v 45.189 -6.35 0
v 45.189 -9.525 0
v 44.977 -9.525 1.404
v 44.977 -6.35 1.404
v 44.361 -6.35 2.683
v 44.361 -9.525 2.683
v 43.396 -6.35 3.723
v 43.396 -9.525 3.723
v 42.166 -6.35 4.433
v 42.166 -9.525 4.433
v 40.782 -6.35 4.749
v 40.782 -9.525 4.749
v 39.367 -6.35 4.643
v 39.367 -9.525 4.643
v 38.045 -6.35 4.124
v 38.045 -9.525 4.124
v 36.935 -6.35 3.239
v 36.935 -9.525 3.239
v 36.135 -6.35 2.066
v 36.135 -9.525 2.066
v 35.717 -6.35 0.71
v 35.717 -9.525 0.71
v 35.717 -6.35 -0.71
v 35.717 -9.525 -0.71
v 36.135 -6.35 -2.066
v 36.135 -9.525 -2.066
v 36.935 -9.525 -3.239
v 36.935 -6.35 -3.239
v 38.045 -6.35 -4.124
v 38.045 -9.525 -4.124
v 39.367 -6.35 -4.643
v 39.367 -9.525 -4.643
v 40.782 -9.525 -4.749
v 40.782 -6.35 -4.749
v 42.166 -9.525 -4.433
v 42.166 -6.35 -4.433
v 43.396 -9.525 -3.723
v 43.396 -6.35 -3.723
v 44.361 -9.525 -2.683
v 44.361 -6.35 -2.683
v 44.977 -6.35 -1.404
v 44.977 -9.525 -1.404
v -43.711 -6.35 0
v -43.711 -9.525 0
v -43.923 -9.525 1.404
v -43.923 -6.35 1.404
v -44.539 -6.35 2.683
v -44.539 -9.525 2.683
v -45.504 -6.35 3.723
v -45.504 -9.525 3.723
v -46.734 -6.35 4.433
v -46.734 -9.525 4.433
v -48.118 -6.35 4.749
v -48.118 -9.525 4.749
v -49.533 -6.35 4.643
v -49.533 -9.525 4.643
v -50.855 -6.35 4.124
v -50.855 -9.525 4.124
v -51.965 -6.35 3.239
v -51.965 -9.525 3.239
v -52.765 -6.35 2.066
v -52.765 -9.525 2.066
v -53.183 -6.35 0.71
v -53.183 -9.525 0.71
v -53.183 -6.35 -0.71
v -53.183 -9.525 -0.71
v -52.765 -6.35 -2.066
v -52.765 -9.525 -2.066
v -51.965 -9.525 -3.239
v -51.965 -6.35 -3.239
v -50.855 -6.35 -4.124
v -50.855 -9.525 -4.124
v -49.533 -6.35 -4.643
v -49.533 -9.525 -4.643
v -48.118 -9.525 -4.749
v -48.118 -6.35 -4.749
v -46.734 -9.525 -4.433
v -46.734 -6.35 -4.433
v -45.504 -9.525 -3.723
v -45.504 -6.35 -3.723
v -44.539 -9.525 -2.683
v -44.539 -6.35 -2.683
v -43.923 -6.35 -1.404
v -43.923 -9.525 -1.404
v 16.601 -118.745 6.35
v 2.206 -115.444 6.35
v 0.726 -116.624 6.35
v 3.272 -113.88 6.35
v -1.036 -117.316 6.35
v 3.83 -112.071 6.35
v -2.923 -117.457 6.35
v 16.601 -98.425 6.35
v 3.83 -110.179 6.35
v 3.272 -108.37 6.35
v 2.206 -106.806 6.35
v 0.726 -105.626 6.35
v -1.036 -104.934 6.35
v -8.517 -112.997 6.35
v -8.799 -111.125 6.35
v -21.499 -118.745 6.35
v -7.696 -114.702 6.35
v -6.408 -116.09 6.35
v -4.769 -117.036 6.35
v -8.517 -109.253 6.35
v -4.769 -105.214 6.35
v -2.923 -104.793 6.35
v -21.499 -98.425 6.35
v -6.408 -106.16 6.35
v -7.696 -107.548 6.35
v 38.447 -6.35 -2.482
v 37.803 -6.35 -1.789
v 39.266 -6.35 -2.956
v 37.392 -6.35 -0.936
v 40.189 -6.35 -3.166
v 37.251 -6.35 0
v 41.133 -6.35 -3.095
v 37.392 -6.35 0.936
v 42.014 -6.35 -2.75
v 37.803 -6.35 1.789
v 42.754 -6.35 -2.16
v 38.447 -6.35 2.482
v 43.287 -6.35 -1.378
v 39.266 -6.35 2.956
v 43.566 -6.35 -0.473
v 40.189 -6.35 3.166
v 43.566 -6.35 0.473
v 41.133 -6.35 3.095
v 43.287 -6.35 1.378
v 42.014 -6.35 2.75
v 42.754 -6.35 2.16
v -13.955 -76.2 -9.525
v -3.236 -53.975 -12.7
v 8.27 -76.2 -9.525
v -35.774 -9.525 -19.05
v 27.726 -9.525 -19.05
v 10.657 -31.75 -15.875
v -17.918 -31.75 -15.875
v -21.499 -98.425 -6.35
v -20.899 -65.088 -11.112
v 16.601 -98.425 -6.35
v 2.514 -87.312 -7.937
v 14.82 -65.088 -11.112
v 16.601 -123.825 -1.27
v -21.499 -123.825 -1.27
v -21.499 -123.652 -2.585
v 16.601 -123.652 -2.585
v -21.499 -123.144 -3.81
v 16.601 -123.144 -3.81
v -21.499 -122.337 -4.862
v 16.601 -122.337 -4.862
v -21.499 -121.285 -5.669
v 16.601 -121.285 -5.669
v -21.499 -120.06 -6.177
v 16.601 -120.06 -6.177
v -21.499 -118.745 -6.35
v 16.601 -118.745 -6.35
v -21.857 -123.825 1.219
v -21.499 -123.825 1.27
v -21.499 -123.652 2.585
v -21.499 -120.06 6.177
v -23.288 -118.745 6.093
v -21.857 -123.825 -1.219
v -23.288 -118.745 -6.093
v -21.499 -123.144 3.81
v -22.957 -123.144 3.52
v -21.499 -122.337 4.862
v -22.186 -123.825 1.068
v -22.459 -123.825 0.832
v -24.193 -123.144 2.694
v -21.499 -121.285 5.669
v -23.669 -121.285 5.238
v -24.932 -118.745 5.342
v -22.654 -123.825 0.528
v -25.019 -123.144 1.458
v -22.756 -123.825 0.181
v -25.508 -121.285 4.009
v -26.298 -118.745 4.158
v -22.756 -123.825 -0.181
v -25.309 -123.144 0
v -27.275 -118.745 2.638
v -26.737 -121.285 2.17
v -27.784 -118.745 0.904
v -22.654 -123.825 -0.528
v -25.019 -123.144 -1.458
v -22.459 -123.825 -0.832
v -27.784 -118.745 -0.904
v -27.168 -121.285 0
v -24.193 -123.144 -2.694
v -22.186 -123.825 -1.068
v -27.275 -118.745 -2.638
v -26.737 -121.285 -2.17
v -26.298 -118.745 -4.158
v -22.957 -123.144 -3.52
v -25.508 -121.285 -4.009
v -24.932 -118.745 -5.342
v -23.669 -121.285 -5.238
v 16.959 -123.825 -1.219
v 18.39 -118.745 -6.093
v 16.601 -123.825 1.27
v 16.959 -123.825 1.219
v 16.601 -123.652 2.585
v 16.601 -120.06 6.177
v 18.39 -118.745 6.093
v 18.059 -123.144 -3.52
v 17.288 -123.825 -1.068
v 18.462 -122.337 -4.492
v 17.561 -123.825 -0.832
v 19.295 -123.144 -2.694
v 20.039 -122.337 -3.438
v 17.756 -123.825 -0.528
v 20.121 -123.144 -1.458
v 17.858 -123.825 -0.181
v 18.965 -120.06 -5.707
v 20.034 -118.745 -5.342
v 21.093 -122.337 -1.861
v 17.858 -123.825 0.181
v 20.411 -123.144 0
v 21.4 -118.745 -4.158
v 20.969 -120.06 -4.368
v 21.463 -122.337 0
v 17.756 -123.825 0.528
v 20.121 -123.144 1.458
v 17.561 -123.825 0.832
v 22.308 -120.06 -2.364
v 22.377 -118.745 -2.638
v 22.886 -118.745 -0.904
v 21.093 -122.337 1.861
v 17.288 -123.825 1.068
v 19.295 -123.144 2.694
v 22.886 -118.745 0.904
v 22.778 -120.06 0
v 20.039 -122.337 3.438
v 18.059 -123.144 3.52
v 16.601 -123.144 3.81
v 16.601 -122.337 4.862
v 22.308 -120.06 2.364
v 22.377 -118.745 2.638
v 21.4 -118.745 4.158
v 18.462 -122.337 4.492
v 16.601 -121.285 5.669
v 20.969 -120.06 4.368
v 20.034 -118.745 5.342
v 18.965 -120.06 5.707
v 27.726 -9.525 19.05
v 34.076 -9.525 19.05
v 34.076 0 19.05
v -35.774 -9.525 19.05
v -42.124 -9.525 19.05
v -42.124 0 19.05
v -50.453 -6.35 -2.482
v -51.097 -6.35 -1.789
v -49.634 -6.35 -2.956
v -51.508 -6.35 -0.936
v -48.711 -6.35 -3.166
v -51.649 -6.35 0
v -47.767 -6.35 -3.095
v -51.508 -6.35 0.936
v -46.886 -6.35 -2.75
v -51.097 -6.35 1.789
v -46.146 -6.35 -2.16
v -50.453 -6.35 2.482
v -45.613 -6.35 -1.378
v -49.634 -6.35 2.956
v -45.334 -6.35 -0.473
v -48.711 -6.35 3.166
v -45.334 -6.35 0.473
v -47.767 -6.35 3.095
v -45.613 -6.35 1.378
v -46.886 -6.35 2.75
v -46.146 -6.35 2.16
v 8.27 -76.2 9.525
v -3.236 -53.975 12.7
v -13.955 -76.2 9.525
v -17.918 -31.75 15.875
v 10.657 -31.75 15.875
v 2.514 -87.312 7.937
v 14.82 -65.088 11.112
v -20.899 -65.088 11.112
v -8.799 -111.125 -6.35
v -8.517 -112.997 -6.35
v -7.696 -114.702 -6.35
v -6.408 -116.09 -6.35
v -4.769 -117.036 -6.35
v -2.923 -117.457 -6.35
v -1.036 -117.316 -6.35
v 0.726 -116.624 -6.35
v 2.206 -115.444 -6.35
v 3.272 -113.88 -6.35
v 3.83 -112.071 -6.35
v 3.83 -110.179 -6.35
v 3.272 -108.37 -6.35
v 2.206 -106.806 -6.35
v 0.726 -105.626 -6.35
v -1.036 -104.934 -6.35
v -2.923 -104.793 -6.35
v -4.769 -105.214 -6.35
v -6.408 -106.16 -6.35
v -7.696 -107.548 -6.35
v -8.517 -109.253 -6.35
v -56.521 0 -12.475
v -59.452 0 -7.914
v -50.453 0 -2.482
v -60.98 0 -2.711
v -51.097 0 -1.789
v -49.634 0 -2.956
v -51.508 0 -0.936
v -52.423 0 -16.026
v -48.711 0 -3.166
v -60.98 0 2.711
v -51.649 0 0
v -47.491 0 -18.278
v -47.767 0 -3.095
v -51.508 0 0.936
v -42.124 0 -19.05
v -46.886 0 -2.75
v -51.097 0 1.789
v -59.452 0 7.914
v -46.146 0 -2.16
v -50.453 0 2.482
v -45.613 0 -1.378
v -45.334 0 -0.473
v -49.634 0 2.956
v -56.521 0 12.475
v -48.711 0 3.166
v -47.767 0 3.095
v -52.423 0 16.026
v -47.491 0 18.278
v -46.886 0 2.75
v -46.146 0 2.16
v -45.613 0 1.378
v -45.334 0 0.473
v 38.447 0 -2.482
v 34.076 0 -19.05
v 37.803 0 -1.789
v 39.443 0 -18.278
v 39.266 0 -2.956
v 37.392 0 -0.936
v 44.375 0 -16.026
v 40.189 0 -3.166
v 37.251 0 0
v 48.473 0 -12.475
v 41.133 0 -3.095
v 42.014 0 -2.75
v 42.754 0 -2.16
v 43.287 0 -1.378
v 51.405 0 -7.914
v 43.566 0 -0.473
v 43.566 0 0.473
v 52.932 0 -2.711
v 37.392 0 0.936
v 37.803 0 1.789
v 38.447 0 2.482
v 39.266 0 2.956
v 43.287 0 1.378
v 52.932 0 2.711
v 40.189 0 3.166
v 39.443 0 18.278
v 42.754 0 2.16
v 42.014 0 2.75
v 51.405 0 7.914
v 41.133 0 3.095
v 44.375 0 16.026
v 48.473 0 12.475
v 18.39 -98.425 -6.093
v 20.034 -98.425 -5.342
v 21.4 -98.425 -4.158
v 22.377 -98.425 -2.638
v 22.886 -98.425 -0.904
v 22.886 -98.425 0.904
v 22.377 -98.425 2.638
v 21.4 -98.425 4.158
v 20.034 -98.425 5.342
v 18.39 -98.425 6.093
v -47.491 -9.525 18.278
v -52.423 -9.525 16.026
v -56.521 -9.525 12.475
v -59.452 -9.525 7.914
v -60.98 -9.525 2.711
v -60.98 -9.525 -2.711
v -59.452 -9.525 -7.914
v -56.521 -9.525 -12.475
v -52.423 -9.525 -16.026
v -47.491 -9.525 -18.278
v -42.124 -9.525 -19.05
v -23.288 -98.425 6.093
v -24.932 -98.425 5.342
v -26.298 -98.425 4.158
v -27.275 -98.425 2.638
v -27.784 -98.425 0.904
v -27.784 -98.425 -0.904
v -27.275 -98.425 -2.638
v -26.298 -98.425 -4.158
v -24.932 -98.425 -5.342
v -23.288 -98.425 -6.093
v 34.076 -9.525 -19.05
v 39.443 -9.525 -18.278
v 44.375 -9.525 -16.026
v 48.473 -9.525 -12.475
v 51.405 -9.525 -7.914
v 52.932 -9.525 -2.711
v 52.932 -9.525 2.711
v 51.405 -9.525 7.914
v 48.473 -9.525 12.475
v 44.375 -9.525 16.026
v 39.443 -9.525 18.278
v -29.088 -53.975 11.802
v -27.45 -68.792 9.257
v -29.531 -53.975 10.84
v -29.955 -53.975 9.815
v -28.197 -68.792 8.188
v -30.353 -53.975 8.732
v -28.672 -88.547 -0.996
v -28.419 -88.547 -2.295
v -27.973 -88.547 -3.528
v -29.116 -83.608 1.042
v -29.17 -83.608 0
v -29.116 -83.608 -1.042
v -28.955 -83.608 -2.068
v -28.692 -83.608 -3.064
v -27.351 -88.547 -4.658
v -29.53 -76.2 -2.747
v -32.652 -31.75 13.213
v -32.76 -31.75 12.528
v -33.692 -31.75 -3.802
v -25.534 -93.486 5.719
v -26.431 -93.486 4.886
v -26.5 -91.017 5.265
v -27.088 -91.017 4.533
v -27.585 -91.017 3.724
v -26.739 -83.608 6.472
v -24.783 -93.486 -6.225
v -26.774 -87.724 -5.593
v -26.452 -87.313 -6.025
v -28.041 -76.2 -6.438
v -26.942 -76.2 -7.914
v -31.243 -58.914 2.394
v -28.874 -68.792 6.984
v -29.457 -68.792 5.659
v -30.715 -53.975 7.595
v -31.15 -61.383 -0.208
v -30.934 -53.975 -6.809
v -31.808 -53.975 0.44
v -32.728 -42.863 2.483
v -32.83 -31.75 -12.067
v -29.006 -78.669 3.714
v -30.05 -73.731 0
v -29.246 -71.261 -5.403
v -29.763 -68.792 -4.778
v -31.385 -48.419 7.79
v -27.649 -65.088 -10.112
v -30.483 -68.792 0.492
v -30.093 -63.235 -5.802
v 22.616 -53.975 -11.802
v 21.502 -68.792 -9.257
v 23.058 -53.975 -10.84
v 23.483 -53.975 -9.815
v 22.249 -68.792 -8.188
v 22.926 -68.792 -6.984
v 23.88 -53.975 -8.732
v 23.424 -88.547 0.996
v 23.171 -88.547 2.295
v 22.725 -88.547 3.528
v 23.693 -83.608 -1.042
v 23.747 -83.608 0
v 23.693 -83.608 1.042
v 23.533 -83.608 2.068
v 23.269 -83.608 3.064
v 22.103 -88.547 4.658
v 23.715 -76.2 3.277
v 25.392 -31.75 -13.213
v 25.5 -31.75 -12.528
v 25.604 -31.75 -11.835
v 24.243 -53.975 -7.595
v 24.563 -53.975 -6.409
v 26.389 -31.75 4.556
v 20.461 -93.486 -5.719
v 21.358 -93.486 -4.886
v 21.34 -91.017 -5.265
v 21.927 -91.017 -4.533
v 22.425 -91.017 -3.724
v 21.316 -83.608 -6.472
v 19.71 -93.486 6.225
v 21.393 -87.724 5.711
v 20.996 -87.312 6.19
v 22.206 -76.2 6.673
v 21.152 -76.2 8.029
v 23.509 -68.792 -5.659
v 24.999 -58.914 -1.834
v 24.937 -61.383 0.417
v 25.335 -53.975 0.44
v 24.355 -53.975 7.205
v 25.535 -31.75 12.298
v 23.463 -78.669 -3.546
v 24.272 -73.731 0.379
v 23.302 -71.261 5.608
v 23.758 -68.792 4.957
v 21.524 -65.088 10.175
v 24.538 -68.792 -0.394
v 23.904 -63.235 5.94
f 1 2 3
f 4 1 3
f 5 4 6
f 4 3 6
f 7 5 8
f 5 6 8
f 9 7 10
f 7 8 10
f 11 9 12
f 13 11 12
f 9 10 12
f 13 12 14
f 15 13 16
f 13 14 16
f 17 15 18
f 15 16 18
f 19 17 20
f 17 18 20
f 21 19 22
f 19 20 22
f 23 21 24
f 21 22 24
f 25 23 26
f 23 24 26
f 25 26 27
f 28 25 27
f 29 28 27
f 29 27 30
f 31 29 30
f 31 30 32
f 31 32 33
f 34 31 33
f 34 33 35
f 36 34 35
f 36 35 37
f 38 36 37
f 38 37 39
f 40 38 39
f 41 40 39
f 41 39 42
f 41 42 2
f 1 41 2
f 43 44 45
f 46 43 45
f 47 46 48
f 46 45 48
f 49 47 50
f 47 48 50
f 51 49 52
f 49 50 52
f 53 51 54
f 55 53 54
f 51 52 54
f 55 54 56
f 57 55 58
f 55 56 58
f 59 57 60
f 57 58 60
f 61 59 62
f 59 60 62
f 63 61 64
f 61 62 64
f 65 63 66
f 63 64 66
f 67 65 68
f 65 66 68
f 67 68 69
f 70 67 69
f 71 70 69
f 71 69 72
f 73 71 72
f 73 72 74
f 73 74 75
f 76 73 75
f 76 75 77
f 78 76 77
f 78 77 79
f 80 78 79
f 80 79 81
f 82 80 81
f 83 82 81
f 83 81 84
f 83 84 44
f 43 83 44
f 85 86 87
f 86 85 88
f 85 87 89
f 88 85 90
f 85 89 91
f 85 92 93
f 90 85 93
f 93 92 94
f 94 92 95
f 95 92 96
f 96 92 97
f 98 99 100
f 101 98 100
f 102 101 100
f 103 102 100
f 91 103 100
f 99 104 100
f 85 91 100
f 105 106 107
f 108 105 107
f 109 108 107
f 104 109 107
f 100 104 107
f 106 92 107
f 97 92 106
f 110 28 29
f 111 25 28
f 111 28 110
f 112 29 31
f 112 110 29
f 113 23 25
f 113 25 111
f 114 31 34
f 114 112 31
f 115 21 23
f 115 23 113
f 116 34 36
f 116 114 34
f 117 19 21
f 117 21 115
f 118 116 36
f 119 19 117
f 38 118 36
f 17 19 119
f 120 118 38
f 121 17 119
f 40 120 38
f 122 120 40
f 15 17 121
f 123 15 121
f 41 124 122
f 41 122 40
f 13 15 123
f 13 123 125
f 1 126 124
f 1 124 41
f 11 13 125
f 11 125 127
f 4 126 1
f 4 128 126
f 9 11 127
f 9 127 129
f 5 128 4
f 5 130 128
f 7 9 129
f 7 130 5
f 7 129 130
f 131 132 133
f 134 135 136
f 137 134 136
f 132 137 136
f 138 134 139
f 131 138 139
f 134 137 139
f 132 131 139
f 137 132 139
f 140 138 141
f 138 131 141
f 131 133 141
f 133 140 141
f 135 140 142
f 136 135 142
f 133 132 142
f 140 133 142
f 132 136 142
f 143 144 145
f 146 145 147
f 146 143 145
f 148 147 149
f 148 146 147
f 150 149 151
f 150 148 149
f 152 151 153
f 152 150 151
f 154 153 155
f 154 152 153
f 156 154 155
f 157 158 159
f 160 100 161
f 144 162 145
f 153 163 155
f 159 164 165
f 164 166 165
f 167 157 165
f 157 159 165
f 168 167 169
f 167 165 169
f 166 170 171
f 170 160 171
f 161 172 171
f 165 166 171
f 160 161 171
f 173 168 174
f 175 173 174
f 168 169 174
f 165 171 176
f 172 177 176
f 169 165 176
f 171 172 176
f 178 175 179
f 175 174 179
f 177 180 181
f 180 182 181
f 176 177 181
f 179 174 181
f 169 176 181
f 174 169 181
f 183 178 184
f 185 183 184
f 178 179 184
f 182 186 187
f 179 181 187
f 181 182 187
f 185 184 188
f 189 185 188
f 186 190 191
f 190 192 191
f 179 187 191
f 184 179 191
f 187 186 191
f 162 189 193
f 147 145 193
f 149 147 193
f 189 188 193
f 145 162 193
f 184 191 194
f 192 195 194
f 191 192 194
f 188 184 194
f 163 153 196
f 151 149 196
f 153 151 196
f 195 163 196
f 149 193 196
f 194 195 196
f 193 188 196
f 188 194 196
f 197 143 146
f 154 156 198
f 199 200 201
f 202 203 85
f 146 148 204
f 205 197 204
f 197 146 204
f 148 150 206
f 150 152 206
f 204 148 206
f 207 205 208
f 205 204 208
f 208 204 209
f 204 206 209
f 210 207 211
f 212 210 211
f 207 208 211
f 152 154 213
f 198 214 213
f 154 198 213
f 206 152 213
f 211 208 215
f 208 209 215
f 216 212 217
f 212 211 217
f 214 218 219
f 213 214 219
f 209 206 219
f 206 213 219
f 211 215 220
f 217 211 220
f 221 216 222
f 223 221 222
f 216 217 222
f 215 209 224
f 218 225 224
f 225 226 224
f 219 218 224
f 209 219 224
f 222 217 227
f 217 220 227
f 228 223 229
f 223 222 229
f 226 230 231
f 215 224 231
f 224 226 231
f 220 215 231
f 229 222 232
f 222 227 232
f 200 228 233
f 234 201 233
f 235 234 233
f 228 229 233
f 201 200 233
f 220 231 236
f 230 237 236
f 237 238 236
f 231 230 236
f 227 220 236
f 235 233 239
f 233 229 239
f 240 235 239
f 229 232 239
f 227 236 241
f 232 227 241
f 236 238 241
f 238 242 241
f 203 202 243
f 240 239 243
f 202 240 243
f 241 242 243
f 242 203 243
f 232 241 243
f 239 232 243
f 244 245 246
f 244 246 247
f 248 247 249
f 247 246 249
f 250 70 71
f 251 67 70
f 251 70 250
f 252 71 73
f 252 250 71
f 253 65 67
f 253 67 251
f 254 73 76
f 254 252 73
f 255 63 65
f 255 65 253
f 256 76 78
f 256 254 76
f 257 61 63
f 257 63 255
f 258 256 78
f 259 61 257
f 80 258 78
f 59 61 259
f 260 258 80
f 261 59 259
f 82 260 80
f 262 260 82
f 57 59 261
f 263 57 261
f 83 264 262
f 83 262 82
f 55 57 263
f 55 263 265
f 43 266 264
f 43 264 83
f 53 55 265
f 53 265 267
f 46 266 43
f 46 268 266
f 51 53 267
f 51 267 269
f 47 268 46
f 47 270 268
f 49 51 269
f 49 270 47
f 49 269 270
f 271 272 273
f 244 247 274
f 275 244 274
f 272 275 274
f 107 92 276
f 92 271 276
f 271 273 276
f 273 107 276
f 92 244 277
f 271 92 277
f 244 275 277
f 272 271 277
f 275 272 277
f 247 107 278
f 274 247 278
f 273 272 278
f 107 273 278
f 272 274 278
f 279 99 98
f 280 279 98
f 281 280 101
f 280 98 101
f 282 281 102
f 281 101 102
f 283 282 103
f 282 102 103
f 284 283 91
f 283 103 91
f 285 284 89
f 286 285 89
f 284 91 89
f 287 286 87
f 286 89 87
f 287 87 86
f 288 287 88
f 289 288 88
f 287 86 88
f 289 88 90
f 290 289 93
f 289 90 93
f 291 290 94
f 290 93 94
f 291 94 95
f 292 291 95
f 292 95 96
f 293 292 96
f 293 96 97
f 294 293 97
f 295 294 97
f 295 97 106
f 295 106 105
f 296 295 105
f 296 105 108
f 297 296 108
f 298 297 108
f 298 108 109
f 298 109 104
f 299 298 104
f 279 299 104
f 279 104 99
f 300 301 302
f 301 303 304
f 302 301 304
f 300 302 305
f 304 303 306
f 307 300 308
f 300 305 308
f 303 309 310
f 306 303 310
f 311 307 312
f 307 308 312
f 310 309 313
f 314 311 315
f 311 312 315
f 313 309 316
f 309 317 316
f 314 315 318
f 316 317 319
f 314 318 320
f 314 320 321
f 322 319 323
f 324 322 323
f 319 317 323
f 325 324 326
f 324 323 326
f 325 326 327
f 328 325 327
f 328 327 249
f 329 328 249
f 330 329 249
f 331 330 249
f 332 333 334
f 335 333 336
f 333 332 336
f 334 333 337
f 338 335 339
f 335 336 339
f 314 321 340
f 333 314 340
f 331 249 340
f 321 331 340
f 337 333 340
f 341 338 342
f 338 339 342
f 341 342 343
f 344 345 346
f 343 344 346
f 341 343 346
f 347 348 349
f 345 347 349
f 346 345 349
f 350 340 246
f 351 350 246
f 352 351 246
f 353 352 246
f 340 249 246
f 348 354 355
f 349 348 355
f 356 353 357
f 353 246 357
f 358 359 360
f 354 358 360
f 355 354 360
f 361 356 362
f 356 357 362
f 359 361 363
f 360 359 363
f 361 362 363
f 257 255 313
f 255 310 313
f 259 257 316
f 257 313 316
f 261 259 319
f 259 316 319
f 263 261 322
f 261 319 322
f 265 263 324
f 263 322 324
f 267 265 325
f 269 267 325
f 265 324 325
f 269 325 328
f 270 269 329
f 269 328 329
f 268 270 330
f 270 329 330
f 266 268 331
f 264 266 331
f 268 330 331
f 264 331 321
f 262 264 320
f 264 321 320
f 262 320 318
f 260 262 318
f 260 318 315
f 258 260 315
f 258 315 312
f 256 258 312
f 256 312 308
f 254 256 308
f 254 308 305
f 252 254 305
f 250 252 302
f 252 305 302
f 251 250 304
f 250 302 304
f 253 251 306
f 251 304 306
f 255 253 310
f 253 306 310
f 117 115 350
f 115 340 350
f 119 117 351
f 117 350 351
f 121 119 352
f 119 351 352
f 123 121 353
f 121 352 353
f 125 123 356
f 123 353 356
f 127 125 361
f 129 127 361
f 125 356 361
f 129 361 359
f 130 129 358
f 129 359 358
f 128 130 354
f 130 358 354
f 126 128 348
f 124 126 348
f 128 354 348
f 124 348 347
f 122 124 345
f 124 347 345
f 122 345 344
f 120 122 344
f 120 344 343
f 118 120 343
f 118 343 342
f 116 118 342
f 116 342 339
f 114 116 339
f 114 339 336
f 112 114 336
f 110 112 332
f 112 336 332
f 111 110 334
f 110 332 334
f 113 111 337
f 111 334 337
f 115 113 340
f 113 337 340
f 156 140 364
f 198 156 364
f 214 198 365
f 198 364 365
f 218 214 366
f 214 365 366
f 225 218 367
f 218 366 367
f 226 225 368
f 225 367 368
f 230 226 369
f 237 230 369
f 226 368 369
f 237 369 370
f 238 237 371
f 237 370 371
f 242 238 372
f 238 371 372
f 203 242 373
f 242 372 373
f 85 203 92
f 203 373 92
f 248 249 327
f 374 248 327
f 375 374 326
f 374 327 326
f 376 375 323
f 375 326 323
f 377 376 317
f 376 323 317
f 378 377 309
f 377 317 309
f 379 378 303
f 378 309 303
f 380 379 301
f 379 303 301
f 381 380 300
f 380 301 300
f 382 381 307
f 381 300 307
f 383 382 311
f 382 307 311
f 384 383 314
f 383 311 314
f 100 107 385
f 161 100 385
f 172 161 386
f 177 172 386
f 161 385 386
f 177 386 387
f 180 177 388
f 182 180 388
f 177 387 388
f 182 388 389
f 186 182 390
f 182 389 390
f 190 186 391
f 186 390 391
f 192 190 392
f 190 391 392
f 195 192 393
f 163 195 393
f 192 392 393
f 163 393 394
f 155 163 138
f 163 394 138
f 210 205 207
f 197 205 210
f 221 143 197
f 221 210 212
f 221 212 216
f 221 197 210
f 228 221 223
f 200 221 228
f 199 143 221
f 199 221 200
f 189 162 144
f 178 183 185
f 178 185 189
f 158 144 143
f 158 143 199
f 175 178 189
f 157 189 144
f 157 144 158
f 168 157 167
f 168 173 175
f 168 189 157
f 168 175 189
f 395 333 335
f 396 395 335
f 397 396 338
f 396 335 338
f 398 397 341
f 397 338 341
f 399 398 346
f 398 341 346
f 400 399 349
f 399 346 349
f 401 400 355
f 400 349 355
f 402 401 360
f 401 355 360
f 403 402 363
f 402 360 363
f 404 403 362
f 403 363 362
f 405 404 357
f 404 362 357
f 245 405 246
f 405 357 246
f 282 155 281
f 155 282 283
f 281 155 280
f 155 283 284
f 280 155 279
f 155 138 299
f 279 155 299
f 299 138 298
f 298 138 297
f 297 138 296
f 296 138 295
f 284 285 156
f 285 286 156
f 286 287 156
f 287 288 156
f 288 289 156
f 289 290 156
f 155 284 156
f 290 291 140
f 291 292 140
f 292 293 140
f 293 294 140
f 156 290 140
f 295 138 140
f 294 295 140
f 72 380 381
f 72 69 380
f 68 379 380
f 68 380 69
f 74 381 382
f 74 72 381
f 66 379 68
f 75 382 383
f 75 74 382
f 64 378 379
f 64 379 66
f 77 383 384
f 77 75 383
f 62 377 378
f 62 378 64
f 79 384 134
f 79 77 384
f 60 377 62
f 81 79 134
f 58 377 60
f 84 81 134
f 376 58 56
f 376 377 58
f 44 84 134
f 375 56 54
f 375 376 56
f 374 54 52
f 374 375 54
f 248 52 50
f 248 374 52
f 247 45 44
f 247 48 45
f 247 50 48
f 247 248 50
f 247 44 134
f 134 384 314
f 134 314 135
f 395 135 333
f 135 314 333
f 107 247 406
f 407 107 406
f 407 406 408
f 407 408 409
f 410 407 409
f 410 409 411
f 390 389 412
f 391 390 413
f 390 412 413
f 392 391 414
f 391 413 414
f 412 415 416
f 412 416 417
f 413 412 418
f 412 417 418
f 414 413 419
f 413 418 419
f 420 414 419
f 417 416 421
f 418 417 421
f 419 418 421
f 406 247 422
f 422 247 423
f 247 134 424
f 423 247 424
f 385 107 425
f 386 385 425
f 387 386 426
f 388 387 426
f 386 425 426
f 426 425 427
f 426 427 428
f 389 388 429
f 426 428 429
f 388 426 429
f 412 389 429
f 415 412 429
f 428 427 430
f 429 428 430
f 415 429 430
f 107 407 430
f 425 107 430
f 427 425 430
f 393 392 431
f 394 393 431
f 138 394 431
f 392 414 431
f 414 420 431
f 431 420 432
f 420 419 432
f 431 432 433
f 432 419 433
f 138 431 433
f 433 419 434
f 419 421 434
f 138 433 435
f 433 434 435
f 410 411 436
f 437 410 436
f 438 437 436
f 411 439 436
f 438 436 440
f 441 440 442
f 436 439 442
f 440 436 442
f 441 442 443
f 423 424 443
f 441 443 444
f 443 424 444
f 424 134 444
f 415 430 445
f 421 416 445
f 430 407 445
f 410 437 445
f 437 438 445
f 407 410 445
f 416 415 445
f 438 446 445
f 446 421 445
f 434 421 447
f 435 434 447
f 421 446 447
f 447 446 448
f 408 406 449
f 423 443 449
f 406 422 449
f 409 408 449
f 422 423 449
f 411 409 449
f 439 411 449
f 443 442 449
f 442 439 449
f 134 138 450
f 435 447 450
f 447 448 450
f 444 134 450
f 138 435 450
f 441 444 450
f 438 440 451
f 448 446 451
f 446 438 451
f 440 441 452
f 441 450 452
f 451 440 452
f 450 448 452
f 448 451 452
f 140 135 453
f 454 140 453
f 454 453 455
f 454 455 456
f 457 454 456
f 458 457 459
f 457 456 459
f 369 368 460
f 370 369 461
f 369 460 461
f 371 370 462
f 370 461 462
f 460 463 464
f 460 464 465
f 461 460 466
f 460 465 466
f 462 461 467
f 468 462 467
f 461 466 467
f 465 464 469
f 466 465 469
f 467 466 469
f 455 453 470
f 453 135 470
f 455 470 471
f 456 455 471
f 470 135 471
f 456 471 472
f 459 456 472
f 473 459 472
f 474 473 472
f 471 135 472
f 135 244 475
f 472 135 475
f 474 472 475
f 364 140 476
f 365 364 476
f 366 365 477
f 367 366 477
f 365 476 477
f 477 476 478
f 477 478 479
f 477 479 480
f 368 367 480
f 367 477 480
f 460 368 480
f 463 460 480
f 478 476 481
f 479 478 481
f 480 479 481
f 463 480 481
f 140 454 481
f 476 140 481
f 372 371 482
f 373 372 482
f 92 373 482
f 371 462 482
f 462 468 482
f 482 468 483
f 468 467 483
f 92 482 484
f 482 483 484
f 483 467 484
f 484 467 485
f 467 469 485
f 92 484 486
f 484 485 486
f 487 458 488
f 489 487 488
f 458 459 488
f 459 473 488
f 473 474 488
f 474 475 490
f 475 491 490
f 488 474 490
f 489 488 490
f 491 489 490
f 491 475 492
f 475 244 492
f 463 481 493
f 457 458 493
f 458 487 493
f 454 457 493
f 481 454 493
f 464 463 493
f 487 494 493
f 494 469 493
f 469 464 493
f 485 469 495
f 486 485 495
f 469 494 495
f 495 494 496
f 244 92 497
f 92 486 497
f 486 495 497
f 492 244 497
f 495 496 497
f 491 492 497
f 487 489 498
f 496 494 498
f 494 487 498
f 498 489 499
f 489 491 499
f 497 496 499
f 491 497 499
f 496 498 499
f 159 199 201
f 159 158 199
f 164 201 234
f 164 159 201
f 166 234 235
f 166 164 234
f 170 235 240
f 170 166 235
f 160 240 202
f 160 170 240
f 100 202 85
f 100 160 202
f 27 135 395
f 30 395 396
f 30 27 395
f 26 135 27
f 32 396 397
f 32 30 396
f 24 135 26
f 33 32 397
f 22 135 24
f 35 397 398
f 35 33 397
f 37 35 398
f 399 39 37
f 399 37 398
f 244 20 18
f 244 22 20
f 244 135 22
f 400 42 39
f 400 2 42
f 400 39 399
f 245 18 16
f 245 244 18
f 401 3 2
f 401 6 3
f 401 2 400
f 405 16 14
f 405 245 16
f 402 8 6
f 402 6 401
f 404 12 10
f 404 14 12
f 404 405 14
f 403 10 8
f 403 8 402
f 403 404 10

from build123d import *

# Parameters (mm, degrees)
F1_DEPTH       = 9.525
F3_D           = 6.35
F3_CBORE_D     = 9.525
F3_CBORE_DEPTH = 3.175
F4_W           = 63.5
F4_H           = 38.1
F8_DEPTH       = 25.4
F10_D          = 12.7
F11_R          = 5.08


with BuildPart() as f1:
    # F0 (on Front) → F1 (new body)
    with BuildSketch(Plane.XZ):
        with BuildLine():
            Line((34.0762832165, 19.05), (-42.1237167835, 19.05))
            ThreePointArc((-42.1237167835, 19.05), (-61.1737167835, 0), (-42.1237167835, -19.05))
            Line((-42.1237167835, -19.05), (34.0762832165, -19.05))
            ThreePointArc((34.0762832165, -19.05), (53.1262832165, 0), (34.0762832165, 19.05))
        make_face()
    extrude(amount=F1_DEPTH)

    # F3 (through all)
    with Locations(Plane.XZ.offset(9.525)):
        with Locations((-48.4737167835, 0), (40.4262832165, 0)):
            CounterBoreHole(F3_D / 2, F3_CBORE_D / 2, F3_CBORE_DEPTH)

    # F6 (on offset) → F7 section 0
    with BuildSketch(Plane.XZ.offset(98.425)):
        with BuildLine():
            Line((16.6010832165, 6.35), (-21.4989167835, 6.35))
            ThreePointArc((-21.4989167835, 6.35), (-27.8489167835, 0), (-21.4989167835, -6.35))
            Line((-21.4989167835, -6.35), (16.6010832165, -6.35))
            ThreePointArc((16.6010832165, -6.35), (22.9510832165, 0), (16.6010832165, 6.35))
        make_face()
    # F4 (on face) → F7 section 1
    with BuildSketch(Plane.XZ.offset(9.525)):
        with Locations((-4.0237167835, 0)):
            Rectangle(F4_W, F4_H)
    loft()

    # F8 (add): a face of the model
    f8_faces = [f1.faces().sort_by_distance(p)[0] for p in [
        (-2.4489167835, -98.425, 0),
    ]]
    extrude(f8_faces, amount=F8_DEPTH)

    # F10 (through all)
    with Locations(Plane(origin=(0, 0, -6.35), x_dir=(1, 0, 0), z_dir=(0, 0, -1))):
        with Locations((-2.4489167835, 111.125)):
            Hole(F10_D / 2)

    # F11
    f11_edges = [f1.edges().sort_by_distance(p)[0] for p in [
        (-27.848917, -123.825, 0),
        (22.951083, -123.825, 0),
        (-2.448917, -123.825, -6.35),
        (-2.448917, -123.825, 6.35),
    ]]
    fillet(f11_edges, radius=F11_R)


solid = f1.part
